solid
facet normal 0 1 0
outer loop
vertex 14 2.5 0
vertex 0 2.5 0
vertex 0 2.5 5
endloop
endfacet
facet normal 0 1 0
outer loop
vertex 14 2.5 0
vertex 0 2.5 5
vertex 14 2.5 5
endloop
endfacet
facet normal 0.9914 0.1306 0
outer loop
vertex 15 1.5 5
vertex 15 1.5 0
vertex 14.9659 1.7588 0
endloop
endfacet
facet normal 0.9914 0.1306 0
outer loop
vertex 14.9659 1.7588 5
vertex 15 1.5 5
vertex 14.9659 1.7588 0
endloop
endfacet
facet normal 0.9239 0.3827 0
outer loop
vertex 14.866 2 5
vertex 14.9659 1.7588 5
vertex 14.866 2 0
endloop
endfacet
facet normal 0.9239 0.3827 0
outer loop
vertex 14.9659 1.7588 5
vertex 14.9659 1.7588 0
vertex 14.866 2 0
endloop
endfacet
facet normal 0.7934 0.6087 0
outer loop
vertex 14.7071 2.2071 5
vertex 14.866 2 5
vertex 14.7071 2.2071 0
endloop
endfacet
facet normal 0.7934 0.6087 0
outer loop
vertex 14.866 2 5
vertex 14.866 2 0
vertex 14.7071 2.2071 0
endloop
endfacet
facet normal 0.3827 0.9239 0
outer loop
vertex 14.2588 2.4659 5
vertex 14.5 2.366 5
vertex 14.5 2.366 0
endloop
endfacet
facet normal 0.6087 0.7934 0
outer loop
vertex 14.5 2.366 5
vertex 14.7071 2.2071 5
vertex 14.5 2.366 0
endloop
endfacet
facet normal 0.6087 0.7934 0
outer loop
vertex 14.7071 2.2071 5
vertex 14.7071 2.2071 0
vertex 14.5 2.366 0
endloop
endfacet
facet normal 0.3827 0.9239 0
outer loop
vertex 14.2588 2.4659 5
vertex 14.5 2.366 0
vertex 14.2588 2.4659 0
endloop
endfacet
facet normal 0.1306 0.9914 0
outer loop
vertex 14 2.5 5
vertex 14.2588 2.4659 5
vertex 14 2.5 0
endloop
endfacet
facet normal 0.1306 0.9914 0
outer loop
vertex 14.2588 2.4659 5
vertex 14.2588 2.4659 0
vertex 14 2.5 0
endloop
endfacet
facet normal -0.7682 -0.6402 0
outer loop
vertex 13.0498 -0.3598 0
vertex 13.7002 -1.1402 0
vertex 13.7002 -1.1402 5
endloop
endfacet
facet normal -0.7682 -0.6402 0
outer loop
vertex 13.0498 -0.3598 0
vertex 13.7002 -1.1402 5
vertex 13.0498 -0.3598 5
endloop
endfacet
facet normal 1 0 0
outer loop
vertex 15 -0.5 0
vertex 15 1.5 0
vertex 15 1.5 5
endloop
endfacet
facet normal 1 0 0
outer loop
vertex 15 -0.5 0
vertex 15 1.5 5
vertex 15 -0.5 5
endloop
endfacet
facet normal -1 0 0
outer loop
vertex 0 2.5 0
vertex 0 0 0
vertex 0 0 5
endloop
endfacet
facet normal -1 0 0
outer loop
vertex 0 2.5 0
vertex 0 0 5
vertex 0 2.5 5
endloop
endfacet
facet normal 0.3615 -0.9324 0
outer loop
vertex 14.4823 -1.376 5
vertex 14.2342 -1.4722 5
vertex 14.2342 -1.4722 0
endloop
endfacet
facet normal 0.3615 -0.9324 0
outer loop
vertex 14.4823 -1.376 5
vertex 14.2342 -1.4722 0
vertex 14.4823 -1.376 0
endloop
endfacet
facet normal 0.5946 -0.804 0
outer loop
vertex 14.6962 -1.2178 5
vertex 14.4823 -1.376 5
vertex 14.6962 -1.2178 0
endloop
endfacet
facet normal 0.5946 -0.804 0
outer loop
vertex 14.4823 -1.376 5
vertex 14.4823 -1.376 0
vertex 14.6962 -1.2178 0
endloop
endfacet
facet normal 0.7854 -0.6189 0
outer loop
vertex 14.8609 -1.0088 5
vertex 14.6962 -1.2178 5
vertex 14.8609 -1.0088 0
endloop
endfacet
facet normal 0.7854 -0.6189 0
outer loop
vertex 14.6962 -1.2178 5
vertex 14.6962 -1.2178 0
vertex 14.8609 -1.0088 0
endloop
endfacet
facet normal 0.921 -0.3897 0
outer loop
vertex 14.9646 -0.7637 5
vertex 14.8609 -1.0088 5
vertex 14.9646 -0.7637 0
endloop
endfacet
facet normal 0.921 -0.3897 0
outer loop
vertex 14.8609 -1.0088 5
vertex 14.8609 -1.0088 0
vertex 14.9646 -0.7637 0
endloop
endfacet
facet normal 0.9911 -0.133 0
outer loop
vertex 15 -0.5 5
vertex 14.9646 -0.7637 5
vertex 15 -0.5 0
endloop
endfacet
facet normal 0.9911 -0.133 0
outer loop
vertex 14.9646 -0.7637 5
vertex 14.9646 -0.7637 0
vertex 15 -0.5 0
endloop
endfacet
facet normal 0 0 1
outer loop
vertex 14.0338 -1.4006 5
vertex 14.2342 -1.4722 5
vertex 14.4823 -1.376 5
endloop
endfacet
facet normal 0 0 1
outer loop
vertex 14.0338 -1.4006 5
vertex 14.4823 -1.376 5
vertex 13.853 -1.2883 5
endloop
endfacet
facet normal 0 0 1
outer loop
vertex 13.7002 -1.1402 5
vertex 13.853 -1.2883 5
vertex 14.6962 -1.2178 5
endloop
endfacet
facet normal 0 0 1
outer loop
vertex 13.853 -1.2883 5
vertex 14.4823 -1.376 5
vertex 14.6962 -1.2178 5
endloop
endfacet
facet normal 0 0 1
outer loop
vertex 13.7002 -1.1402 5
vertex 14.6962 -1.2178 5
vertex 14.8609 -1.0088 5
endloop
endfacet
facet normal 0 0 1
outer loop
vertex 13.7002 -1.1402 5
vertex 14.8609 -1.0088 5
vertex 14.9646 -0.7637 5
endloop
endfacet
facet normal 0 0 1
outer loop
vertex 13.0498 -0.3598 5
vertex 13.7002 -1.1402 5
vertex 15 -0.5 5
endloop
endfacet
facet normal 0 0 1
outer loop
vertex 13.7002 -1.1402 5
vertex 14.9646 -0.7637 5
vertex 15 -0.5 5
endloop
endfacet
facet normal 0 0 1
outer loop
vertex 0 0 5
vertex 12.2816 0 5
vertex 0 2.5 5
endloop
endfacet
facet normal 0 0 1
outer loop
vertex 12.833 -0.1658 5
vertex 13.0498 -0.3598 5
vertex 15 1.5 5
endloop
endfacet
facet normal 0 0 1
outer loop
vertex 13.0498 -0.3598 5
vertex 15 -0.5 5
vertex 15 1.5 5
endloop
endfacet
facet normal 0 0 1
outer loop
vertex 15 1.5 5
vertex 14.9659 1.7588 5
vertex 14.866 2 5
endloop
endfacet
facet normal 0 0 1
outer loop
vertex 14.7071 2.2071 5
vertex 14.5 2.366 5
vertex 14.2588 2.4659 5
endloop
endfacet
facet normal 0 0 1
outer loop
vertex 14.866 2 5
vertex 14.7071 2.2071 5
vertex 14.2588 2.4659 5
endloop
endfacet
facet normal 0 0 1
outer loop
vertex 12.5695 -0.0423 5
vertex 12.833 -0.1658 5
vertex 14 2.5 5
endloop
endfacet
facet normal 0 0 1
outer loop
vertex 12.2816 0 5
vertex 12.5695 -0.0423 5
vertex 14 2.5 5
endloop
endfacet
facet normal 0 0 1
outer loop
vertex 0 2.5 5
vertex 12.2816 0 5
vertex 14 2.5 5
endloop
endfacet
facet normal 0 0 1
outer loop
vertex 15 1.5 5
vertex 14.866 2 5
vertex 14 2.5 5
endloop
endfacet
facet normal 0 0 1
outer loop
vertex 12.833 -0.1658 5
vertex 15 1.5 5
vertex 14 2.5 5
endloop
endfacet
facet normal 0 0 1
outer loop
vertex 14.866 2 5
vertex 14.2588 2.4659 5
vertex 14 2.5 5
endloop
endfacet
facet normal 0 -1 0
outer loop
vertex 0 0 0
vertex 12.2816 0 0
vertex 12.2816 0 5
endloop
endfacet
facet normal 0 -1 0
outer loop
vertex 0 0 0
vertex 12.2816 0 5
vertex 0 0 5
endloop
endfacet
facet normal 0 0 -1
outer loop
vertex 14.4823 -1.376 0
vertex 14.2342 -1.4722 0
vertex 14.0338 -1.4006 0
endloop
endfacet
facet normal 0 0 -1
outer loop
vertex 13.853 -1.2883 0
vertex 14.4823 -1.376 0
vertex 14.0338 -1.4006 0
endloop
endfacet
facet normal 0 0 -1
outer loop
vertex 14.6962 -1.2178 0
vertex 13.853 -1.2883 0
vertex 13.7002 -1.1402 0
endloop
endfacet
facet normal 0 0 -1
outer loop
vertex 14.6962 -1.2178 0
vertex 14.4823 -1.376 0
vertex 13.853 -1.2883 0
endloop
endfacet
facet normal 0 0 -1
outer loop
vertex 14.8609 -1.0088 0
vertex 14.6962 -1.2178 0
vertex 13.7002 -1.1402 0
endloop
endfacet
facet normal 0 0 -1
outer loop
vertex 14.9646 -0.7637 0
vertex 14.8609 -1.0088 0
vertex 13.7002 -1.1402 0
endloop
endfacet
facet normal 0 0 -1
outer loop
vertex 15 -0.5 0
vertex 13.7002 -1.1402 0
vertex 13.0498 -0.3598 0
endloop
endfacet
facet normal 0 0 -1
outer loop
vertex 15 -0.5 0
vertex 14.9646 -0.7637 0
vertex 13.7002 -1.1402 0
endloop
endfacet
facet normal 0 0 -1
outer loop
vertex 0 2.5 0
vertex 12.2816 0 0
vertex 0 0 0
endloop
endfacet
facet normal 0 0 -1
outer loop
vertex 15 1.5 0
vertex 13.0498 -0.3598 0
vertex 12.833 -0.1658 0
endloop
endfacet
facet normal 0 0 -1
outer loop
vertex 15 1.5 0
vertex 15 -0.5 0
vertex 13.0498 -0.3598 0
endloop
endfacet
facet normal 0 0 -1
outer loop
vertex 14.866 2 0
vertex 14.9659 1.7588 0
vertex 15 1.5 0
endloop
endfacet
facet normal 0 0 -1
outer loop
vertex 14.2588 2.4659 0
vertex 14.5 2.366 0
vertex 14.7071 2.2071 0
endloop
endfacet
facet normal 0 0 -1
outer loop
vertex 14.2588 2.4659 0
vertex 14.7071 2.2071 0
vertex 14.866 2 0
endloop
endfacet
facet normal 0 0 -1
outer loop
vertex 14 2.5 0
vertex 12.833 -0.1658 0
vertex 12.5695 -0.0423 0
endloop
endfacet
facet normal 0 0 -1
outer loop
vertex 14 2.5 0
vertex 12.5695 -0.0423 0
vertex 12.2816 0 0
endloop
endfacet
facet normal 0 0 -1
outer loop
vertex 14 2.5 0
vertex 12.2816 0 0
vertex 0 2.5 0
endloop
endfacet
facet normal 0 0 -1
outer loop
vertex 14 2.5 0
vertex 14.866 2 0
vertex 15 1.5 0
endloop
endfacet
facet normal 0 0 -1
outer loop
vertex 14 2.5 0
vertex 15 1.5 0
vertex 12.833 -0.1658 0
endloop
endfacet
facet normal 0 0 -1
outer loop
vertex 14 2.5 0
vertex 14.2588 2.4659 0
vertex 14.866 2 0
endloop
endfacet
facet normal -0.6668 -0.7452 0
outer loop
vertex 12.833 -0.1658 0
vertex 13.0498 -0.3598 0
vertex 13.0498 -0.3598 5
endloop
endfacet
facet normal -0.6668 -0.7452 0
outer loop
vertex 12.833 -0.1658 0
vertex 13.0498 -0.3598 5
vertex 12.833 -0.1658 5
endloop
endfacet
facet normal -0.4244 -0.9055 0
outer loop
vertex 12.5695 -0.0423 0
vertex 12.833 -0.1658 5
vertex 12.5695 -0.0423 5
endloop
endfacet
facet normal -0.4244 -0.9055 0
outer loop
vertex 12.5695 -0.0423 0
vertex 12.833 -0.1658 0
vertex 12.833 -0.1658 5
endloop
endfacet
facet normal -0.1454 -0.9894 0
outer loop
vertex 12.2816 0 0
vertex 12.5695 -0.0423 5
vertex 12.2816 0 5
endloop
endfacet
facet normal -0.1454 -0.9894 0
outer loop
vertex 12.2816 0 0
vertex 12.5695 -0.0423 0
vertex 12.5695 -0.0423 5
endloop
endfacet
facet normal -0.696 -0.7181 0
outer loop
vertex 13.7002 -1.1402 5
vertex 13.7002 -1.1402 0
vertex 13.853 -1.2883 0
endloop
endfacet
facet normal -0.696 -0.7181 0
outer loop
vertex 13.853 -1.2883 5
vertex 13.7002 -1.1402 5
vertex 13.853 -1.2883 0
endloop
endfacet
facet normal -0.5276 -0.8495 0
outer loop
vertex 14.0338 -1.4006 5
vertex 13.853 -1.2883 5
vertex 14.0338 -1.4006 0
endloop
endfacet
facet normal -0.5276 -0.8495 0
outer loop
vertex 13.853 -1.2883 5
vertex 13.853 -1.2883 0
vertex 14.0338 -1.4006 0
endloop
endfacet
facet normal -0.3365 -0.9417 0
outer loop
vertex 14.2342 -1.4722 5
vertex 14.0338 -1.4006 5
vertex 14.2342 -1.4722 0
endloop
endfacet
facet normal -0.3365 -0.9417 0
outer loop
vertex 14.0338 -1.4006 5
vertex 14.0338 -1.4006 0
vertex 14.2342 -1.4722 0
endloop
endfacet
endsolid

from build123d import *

# Parameters (mm, degrees)
BOSS_EXTRUDE1_DEPTH = 5
FILLET1_R           = 1


with BuildPart() as part:
    # Sketch1 → Boss-Extrude1 (new body)
    with BuildSketch(Plane.XY):
        Polygon((0, 2.5), (15, 2.5), (15, -1.5), (14, -1.5), (12.75, 0), (0, 0), align=None)
    extrude(amount=BOSS_EXTRUDE1_DEPTH)

    # Fillet1
    # the kernel refuses this fillet: 1 mm, written as the material it adds along each edge
    with BuildSketch(Plane(origin=(12.75, 0, 0), x_dir=(0.6401843996644788, -0.7682212795973767, 0), z_dir=(0, 0, 1))) as fillet1_piece_1:
        with BuildLine():
            CenterArc((FILLET1_R * 0.468374945984, -FILLET1_R), FILLET1_R, 90, 50.194428908)
            Line((-FILLET1_R * 0.299846333613, -FILLET1_R * 0.359815600336), (0, 0))
            Line((0, 0), (FILLET1_R * 0.468374945984, 0))
        make_face()
    extrude(amount=5)
    # the kernel refuses this fillet: 1 mm, written as the material it takes off along each edge
    with BuildSketch(Plane(origin=(15, 2.5, -2.5), x_dir=(-1, 0, 0), z_dir=(0, 0, 1)), Plane(origin=(15, -1.5, -2.5), x_dir=(0, 1, 0), z_dir=(0, 0, 1))) as fillet1_2_piece_1:
        with BuildLine():
            CenterArc((FILLET1_R, FILLET1_R), FILLET1_R, 180, 90)
            Line((0, FILLET1_R), (0, 0))
            Line((0, 0), (FILLET1_R, 0))
        make_face()
    extrude(amount=10, mode=Mode.SUBTRACT)
    with BuildSketch(Plane(origin=(14, -1.5, -1.170937365), x_dir=(1, 0, 0), z_dir=(0, 0, 1))) as fillet1_2_piece_2:
        with BuildLine():
            CenterArc((FILLET1_R * 0.468374945984, FILLET1_R), FILLET1_R, 219.805571092, 50.194428908)
            Line((-FILLET1_R * 0.299846333613, FILLET1_R * 0.359815600336), (0, 0))
            Line((0, 0), (FILLET1_R * 0.468374945984, 0))
        make_face()
    extrude(amount=7.34187473, mode=Mode.SUBTRACT)


solid = part.part
